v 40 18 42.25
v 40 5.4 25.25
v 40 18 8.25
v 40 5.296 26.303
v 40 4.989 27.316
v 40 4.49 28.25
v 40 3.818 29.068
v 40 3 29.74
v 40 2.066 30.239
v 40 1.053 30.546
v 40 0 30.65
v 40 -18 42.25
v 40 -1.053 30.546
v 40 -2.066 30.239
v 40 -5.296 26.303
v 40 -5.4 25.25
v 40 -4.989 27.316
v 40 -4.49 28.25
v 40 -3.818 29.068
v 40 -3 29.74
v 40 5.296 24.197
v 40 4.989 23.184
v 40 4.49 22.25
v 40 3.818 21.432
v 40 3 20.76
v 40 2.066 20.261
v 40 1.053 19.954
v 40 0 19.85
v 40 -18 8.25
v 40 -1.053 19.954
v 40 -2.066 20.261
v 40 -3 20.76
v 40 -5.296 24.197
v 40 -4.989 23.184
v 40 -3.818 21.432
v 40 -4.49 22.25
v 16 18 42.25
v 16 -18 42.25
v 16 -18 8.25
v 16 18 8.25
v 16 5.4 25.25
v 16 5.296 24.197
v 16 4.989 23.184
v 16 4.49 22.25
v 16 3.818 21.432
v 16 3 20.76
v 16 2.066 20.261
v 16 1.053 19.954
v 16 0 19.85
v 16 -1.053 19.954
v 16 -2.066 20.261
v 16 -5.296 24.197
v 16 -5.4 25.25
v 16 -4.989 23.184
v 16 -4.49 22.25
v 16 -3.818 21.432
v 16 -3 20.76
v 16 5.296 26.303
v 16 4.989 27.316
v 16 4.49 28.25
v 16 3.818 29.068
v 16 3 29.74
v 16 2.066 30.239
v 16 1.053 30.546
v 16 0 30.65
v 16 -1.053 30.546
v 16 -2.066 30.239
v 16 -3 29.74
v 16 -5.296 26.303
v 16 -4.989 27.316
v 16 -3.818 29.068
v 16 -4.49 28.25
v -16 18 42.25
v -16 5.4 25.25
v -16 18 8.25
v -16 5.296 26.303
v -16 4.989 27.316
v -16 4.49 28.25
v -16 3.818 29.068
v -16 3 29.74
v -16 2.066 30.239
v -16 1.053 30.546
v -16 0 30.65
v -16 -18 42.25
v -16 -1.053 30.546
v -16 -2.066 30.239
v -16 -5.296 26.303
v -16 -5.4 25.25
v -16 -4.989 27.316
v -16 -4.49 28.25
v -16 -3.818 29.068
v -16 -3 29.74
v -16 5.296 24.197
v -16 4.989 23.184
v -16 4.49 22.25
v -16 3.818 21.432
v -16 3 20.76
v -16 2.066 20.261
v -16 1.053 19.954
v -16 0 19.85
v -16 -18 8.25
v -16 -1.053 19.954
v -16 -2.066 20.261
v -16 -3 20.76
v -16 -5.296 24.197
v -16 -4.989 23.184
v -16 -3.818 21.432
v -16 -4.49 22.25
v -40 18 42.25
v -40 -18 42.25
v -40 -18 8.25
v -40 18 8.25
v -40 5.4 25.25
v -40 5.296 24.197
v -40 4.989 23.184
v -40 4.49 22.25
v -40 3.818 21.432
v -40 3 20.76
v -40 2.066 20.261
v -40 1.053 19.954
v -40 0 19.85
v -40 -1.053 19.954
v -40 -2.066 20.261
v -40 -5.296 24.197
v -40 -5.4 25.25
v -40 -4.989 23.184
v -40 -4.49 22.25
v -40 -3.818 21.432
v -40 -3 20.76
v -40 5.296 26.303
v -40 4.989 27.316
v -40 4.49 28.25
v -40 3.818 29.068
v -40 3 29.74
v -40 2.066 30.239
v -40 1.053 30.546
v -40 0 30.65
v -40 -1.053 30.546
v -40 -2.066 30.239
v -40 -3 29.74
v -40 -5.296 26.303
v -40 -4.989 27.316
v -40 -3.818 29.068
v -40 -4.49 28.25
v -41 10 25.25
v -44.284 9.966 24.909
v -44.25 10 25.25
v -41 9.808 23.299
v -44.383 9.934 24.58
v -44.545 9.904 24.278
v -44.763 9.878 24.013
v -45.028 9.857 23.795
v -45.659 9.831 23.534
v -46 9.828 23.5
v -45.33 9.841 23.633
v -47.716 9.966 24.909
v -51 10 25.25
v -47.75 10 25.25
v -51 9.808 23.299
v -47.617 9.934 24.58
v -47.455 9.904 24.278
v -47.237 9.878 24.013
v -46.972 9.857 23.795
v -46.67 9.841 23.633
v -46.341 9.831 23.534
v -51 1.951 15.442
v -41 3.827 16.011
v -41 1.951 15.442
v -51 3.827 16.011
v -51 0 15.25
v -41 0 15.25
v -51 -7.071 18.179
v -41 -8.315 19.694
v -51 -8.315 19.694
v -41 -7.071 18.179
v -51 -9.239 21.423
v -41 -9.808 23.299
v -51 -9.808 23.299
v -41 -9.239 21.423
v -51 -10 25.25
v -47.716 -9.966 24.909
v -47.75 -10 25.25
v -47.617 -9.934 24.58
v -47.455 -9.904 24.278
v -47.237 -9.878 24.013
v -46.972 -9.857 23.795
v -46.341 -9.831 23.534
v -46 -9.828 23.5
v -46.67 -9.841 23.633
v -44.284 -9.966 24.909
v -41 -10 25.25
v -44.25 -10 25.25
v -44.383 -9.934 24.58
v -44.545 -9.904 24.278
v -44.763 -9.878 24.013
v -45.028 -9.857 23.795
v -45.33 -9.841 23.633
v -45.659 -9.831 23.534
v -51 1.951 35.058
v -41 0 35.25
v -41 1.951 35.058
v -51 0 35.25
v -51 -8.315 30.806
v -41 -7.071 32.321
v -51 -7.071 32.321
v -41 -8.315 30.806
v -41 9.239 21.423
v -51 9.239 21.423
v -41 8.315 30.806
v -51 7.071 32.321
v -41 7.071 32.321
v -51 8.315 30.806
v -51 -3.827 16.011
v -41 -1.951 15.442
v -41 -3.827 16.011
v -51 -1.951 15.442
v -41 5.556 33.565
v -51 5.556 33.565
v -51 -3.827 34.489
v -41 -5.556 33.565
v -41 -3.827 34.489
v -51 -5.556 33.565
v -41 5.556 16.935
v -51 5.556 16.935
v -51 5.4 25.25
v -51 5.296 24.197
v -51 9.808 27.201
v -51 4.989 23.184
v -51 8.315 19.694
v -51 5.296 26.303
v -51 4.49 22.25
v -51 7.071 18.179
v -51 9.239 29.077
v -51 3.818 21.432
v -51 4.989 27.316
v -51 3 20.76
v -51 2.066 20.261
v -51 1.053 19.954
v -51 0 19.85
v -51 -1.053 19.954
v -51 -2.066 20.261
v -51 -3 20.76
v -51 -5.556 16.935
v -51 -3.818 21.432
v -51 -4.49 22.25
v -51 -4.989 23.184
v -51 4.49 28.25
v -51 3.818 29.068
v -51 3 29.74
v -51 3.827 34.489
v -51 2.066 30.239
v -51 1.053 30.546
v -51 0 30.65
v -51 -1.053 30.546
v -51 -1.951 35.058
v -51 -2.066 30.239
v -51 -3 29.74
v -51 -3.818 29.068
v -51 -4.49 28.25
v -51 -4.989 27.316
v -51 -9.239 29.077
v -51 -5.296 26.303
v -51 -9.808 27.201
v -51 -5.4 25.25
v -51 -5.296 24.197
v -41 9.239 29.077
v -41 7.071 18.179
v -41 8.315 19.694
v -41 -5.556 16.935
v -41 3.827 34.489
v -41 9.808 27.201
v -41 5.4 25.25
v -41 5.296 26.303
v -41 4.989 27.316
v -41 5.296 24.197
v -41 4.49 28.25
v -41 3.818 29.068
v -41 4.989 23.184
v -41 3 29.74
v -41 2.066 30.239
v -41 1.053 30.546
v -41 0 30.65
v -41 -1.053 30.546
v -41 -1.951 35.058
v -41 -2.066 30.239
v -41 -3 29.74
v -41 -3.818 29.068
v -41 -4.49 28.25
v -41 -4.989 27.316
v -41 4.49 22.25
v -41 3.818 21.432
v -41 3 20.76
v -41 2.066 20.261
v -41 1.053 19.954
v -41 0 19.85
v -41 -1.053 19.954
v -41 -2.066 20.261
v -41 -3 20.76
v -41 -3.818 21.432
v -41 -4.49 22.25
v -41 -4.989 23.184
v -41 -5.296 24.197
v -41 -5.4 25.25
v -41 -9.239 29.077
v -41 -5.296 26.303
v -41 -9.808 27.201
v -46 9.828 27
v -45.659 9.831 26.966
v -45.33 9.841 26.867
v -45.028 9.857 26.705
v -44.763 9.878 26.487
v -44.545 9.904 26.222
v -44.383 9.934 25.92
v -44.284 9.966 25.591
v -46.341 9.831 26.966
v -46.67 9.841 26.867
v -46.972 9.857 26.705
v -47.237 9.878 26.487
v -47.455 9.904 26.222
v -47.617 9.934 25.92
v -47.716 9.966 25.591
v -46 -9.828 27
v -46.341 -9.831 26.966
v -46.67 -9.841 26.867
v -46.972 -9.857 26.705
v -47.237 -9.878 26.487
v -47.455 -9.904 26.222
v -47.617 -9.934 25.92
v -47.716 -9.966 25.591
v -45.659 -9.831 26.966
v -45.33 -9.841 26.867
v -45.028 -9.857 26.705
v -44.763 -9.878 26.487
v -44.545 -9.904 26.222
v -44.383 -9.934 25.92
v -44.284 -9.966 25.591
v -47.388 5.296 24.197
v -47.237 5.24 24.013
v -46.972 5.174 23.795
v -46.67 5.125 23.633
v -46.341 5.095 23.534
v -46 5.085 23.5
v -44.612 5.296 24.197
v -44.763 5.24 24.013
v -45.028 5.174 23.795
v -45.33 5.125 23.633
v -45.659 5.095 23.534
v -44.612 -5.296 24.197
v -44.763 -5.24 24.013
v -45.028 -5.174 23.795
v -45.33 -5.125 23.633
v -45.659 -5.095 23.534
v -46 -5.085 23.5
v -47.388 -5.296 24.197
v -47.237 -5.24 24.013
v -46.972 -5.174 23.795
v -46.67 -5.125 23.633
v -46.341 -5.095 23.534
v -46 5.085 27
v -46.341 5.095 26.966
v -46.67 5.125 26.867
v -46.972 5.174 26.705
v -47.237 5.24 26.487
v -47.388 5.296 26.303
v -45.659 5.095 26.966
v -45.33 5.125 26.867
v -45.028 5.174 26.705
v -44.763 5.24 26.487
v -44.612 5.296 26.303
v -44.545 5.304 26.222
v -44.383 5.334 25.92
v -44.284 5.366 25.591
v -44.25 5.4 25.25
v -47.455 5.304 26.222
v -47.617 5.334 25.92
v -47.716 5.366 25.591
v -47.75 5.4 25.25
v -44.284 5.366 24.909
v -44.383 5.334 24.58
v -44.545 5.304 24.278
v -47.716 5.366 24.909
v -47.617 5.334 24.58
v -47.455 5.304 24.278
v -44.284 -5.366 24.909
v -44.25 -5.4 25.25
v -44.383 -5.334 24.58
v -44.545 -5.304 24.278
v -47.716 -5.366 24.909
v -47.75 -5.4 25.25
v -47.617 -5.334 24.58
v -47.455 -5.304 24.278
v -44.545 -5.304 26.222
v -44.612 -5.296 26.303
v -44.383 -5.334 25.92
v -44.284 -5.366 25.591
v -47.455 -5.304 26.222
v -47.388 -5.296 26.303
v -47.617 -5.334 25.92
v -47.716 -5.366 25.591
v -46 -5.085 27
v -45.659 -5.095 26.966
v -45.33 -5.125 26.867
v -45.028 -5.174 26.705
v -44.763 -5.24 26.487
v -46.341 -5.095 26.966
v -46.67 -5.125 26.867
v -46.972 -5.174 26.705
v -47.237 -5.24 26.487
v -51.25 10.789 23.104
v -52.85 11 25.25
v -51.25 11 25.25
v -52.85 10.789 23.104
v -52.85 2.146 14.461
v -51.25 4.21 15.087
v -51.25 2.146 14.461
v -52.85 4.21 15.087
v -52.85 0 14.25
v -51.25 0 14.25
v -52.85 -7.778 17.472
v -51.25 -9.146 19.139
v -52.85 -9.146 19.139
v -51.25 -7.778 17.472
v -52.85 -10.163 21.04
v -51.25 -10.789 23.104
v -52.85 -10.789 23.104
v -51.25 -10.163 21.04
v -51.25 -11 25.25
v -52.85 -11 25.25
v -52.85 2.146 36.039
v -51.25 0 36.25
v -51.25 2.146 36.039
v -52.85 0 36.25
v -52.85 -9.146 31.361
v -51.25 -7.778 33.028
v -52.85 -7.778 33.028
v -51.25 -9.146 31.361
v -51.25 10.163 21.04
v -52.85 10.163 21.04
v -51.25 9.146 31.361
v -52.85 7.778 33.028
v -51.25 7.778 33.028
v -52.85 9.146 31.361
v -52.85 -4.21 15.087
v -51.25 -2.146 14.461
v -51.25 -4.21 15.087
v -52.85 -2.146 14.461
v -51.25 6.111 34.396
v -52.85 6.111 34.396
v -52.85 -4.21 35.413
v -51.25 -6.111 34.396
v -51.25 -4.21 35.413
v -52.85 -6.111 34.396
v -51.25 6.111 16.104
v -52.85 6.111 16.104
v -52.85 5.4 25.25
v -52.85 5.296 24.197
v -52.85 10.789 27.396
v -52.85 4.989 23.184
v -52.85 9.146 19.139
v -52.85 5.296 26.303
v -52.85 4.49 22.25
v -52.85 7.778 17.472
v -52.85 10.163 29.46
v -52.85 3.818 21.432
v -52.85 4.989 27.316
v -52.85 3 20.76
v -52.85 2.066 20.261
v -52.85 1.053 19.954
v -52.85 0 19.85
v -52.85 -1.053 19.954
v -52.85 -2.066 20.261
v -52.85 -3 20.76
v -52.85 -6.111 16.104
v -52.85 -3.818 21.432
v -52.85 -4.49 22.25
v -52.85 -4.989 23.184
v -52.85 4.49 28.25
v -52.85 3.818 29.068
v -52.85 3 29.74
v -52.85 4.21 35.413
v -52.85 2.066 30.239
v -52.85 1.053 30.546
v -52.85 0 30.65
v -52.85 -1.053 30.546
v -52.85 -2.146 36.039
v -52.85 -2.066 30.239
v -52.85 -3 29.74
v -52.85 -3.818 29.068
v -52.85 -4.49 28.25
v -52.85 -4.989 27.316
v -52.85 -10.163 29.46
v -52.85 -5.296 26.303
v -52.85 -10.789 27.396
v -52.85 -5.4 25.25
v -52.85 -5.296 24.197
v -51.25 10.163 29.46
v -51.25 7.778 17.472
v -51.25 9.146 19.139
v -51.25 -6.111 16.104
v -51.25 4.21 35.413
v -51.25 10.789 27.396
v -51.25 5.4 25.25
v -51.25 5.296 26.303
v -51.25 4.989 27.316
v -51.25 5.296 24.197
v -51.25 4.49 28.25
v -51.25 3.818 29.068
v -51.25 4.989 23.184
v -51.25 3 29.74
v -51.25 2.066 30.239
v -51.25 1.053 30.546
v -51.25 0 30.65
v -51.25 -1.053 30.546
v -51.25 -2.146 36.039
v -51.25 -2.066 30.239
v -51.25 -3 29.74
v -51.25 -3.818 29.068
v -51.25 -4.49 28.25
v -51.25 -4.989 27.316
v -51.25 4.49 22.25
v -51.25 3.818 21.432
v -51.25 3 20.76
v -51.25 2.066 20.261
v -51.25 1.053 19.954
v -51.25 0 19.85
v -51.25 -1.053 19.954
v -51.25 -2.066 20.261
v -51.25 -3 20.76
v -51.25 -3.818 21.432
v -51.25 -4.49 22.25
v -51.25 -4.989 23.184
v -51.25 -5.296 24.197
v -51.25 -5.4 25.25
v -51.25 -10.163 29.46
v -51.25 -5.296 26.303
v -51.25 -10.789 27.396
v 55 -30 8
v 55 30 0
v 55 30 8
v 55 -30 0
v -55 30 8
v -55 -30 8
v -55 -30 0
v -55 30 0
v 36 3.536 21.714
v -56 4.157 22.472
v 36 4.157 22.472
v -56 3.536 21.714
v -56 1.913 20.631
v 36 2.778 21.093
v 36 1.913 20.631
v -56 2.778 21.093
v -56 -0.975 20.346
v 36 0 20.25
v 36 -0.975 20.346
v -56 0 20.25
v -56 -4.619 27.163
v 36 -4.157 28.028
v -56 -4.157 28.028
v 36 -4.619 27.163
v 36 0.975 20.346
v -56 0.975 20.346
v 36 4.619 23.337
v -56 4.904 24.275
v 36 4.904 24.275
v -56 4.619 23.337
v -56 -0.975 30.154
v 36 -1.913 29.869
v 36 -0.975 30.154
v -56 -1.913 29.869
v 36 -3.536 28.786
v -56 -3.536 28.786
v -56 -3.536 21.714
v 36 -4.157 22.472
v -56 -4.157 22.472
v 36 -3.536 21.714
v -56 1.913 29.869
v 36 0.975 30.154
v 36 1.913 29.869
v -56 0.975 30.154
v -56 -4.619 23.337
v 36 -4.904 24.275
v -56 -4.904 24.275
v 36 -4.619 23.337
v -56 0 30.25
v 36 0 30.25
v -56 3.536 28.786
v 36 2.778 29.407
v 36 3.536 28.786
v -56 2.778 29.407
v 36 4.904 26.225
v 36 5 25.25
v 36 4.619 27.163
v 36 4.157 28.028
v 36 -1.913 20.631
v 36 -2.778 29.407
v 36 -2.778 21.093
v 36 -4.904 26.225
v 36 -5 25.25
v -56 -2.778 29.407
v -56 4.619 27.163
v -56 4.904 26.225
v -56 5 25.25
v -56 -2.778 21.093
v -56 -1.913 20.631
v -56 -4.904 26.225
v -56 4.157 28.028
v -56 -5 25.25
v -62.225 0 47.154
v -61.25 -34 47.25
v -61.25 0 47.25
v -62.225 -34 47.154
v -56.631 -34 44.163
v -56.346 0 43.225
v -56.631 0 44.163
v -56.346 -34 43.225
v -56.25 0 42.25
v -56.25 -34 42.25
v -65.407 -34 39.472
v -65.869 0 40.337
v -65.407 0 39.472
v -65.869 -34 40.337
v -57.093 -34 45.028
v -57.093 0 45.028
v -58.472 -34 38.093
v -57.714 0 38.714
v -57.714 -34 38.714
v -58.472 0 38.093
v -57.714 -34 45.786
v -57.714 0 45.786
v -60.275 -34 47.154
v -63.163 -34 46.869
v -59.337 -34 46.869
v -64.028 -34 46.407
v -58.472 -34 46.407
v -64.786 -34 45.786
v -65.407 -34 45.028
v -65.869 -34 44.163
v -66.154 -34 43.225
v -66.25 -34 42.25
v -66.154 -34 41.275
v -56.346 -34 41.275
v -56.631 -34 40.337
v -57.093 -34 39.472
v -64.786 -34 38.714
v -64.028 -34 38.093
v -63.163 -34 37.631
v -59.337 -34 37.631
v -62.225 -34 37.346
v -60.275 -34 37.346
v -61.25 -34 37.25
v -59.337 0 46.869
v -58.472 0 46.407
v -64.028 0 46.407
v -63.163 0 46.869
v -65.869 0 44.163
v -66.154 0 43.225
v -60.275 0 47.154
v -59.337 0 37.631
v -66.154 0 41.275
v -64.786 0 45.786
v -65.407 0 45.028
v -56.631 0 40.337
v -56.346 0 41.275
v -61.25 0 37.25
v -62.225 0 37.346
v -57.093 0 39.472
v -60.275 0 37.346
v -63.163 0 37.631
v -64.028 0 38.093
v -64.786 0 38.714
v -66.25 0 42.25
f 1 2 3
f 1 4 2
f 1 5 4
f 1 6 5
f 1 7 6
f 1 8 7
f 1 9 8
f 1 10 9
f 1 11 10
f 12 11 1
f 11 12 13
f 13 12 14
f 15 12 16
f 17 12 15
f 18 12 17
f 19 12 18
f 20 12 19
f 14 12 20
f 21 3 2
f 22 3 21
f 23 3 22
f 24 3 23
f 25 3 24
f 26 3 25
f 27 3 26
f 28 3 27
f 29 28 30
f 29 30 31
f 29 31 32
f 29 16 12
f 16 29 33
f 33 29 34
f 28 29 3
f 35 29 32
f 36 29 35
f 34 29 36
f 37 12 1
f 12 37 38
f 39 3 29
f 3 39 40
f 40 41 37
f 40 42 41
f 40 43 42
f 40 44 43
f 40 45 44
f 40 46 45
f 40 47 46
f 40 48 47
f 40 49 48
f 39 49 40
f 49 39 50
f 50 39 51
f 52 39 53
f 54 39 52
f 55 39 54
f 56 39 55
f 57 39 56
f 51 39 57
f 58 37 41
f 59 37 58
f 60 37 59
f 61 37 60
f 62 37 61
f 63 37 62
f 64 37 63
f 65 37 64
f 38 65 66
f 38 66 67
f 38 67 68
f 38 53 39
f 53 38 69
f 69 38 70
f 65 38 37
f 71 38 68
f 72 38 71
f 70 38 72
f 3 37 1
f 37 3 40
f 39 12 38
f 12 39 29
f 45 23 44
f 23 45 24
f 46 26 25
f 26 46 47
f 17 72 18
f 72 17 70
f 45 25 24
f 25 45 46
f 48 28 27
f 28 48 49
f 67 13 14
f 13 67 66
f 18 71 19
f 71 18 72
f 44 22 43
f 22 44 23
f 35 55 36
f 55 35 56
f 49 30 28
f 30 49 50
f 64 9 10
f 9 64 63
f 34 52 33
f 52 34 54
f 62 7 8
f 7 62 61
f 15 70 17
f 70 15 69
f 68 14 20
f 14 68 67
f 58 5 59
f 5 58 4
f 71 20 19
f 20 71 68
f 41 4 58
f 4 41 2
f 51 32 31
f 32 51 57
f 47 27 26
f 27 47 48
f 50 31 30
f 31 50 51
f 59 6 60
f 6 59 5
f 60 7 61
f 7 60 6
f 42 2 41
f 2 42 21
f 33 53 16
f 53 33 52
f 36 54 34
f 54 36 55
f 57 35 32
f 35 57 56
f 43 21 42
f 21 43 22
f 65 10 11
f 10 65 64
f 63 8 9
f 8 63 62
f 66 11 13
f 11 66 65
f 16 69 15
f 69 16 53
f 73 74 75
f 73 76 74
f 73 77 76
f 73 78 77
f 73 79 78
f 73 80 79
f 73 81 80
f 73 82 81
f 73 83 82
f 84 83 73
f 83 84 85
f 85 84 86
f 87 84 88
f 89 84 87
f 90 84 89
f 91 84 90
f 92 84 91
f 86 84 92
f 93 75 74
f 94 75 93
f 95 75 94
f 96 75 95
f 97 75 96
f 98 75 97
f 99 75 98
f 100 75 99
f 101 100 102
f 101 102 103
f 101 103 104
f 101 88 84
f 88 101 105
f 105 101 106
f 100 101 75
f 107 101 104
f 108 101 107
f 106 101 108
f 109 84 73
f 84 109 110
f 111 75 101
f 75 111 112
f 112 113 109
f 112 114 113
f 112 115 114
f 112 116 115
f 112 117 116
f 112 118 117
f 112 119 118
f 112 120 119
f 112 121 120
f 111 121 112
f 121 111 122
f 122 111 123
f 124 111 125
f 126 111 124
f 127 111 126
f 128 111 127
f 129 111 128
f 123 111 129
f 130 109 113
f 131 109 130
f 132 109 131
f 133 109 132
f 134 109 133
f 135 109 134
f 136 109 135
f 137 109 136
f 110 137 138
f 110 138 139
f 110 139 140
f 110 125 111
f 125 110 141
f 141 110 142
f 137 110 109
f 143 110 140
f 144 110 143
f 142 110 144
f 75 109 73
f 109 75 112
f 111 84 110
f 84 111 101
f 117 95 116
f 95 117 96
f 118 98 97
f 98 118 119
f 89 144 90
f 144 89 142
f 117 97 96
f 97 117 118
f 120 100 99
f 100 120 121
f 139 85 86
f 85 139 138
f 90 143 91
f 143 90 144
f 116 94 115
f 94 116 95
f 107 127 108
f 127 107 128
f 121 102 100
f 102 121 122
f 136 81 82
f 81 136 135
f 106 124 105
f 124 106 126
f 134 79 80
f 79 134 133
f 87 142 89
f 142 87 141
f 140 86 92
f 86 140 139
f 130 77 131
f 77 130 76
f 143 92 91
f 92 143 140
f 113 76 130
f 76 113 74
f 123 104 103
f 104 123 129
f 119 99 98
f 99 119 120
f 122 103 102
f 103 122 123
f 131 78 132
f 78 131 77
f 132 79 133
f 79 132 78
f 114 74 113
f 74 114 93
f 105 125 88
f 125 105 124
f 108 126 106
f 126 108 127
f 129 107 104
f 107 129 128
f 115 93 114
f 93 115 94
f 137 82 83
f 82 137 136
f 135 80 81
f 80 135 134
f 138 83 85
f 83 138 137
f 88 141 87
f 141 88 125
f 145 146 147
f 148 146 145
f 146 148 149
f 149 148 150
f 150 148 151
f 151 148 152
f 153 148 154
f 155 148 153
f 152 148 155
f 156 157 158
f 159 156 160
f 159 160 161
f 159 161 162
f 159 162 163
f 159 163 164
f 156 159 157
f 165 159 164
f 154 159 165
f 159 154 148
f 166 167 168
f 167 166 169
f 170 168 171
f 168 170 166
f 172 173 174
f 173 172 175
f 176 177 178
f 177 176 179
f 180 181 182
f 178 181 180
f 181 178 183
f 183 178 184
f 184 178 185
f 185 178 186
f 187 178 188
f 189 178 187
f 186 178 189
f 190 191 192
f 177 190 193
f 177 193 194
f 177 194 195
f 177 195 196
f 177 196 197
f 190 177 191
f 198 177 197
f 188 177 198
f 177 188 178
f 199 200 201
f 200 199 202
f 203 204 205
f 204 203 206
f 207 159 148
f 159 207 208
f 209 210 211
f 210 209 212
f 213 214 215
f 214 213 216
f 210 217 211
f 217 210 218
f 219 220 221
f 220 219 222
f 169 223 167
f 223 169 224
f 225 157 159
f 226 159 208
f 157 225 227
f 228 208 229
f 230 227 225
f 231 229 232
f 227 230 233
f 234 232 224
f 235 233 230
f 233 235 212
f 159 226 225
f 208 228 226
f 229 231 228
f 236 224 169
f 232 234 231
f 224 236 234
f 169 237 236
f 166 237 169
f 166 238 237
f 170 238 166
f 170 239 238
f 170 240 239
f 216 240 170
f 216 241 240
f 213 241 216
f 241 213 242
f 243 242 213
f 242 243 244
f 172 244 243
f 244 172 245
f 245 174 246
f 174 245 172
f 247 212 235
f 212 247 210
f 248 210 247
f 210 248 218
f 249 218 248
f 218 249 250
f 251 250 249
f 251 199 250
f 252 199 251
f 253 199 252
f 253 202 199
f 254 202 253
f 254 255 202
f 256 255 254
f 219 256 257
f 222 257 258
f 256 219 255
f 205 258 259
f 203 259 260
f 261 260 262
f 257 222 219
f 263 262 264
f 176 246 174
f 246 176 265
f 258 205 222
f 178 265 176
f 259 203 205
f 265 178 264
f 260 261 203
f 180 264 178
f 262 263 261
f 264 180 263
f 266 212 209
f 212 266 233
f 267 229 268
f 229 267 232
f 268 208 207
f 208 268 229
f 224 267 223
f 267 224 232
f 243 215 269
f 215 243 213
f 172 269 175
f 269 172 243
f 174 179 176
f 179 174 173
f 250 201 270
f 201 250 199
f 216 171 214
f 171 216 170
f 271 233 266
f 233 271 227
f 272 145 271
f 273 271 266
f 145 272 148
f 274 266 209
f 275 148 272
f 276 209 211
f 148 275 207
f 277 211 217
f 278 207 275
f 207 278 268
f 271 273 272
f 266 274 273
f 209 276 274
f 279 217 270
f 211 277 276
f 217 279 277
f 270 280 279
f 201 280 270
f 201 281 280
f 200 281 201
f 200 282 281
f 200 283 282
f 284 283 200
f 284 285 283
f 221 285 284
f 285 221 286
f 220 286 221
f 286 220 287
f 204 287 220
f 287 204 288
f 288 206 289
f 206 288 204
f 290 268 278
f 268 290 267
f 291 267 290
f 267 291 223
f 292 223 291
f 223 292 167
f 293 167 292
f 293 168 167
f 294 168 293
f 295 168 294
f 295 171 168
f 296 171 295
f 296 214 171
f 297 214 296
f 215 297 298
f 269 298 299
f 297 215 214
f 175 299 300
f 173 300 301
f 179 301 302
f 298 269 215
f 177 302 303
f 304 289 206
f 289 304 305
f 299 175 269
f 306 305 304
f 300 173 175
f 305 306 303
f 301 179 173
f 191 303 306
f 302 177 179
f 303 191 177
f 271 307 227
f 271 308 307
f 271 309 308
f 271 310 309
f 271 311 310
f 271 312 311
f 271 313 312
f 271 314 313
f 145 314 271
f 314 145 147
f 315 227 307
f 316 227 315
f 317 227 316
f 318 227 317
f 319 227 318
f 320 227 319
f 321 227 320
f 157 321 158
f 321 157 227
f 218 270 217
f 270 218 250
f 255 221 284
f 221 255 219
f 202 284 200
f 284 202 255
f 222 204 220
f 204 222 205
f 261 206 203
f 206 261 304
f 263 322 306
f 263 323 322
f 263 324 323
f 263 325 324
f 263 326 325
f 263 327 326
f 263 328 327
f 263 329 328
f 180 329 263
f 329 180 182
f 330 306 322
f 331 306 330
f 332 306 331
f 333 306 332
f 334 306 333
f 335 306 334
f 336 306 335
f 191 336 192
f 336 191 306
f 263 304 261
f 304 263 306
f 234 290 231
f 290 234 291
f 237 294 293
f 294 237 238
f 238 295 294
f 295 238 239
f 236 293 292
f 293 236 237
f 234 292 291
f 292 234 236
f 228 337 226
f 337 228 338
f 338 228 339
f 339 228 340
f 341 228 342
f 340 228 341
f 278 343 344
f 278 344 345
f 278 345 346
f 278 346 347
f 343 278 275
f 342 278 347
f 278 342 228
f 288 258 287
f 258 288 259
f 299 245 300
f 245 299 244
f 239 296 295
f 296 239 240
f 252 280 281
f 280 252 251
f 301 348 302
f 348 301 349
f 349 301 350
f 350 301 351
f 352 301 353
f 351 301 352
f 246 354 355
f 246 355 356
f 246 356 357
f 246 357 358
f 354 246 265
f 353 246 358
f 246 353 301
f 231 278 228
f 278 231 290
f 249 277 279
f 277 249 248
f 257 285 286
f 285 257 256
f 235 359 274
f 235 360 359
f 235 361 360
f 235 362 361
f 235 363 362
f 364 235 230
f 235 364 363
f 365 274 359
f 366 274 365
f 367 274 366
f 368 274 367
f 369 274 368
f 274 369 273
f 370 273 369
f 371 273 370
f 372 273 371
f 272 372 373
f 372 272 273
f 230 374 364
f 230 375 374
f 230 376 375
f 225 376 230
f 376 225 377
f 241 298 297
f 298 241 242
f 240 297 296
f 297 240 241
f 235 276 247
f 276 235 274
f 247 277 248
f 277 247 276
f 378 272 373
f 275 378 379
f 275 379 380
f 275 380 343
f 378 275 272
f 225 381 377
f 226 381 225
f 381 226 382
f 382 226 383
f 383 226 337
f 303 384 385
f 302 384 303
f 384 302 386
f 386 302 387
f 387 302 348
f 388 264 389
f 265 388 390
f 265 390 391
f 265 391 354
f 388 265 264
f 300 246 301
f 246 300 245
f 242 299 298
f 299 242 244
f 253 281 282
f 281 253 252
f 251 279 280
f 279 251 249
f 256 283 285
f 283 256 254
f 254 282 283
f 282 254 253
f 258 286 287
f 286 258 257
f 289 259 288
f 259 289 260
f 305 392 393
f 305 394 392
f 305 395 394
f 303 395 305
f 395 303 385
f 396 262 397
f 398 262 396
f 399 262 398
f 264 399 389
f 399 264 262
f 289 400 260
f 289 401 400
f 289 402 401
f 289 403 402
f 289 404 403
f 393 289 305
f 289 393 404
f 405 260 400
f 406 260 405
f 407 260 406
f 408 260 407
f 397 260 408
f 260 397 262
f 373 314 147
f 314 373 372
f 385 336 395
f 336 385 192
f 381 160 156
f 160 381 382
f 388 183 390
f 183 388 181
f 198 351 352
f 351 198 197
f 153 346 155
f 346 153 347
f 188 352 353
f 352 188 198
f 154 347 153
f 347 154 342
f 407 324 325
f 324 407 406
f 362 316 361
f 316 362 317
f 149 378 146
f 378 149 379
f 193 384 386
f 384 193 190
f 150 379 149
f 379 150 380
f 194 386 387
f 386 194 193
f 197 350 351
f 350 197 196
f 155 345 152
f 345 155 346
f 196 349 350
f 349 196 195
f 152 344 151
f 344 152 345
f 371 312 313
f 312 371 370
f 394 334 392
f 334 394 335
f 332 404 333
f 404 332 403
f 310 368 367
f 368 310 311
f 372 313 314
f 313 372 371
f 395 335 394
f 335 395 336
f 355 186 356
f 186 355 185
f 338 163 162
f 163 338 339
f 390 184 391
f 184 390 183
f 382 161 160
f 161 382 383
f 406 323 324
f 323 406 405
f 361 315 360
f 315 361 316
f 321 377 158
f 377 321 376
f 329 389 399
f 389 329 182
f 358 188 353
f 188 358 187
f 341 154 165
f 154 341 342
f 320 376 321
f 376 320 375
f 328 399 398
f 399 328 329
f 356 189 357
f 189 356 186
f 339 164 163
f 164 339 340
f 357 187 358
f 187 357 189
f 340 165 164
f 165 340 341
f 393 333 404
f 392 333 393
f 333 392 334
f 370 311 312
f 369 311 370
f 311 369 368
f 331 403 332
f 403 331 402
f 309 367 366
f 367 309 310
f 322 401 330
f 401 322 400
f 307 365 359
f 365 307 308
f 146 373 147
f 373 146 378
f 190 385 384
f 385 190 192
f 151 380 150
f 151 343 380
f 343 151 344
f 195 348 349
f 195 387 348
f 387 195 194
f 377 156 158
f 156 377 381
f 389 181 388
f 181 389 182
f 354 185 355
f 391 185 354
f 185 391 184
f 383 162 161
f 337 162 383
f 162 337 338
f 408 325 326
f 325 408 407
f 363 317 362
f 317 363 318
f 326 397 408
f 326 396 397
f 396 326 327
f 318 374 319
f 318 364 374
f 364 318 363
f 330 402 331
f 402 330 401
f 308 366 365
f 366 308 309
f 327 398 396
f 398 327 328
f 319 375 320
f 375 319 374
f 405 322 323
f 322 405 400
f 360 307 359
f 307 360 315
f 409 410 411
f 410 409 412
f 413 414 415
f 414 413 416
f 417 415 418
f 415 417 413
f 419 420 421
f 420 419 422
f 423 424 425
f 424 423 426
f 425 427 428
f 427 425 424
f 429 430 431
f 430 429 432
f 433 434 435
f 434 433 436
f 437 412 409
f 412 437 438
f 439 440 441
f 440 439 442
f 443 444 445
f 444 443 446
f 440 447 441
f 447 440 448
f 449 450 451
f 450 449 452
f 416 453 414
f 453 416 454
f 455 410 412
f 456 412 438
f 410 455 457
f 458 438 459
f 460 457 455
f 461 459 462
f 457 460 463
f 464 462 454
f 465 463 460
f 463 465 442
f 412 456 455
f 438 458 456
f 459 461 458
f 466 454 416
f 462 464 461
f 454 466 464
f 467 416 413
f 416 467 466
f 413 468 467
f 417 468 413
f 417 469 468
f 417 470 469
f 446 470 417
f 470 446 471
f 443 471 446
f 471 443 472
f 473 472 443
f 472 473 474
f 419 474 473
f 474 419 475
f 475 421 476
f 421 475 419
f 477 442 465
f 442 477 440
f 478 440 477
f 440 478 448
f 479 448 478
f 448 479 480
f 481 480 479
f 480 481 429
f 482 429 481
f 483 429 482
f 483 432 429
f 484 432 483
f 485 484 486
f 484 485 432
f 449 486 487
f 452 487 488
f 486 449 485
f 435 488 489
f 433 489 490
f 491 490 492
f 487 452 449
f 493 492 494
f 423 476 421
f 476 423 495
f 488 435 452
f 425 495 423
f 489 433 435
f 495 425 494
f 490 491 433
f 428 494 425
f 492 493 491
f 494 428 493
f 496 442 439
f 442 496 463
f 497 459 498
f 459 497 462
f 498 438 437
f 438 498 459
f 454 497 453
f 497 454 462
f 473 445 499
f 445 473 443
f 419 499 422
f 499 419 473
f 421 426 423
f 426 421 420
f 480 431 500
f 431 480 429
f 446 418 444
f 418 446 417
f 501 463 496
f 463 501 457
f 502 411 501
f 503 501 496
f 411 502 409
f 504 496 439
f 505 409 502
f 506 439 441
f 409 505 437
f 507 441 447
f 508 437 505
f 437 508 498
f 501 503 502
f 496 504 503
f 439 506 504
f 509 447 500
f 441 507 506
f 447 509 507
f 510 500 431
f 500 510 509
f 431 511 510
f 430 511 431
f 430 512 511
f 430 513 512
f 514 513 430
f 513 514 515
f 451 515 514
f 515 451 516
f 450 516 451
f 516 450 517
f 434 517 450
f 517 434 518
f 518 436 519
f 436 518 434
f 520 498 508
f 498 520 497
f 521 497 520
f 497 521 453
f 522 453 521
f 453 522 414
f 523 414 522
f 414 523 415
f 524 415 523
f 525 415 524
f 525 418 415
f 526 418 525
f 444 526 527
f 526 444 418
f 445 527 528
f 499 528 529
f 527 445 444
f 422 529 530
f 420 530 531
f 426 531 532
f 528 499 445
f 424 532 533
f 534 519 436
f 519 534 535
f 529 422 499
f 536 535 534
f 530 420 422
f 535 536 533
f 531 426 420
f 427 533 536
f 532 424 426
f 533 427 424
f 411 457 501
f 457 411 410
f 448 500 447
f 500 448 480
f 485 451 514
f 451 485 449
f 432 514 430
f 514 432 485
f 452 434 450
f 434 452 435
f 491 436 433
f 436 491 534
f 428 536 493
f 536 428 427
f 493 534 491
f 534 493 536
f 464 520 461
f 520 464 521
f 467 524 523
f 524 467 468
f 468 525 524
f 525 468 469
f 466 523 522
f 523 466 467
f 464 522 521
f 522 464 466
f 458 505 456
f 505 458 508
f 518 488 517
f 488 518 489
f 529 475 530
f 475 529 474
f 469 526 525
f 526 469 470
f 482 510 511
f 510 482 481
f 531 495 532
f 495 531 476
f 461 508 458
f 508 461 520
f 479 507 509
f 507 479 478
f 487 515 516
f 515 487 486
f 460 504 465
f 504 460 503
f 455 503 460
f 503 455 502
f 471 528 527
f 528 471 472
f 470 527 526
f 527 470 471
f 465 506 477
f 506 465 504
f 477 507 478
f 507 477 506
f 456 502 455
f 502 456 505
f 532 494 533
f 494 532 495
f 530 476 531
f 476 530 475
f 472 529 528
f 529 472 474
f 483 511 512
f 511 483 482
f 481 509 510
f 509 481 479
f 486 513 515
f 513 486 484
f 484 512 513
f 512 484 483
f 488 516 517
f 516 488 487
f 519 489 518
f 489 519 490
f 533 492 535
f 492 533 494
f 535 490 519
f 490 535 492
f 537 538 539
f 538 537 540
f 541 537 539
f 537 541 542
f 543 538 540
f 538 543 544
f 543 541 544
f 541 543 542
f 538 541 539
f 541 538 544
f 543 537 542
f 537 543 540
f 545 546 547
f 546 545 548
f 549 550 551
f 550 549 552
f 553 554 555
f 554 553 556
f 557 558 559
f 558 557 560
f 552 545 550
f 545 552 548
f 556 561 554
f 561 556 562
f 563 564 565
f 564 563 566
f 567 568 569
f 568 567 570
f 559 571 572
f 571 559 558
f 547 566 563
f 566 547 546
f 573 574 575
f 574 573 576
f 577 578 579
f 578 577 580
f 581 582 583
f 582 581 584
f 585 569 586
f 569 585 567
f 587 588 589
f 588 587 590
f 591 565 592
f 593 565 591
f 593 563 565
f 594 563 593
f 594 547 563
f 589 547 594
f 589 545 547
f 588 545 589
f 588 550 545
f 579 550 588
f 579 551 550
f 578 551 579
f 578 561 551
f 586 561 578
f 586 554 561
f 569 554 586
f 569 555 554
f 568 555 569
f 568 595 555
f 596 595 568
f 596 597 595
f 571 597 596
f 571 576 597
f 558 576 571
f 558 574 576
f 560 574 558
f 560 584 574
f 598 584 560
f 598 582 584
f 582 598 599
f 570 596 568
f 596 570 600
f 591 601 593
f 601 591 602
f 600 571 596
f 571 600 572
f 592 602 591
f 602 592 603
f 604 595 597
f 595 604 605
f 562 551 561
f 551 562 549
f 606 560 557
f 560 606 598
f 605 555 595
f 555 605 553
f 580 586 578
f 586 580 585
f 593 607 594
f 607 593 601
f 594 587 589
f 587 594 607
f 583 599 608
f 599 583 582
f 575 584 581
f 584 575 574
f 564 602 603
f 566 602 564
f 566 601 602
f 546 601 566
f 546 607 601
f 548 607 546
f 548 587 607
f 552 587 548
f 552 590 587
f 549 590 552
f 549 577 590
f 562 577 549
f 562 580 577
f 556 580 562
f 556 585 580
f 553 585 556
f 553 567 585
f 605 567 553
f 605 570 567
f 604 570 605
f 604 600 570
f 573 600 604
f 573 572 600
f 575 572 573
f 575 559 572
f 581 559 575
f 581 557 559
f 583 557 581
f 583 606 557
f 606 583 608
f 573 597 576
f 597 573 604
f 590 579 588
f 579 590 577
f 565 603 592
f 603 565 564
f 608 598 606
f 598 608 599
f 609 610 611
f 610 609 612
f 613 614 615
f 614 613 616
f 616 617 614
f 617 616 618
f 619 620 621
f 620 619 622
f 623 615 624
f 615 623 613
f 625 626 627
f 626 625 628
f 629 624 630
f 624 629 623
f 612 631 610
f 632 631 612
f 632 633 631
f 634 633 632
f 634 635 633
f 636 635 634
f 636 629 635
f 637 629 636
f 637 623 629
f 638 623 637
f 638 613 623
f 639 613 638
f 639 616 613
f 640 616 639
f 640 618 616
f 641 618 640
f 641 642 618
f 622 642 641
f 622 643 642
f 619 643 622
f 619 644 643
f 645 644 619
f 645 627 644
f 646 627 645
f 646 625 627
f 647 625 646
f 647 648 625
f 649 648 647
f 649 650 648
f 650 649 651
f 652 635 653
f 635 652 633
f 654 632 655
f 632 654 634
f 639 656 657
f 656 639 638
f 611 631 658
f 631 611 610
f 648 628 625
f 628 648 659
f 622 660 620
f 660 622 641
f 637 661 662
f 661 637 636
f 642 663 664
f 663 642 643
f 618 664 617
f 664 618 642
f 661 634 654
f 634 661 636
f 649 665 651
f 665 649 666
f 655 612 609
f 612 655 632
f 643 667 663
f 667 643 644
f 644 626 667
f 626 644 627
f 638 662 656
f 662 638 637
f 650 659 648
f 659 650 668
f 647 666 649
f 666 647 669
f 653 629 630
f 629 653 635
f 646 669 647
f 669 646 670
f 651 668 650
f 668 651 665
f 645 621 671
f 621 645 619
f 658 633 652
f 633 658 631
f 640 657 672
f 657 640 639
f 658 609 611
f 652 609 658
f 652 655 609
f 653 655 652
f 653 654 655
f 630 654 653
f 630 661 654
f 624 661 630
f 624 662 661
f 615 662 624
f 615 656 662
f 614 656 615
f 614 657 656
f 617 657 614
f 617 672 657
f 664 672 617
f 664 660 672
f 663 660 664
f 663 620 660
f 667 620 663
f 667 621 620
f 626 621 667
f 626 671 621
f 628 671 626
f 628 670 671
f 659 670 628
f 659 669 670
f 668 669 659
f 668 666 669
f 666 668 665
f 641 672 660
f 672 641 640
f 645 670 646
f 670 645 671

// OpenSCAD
$fn = 32;

// ------------------------------------------------------------------------
// Machine vise: screw d10, jaws 24 x 34 mm
// Every part is its own module, assembly() places every instance.
// ------------------------------------------------------------------------

// --- part 1 ---
module vise_bed() {
  difference() {
    translate([-55, -30, 0]) cube([110, 60, 8]);
  }
}

// --- part 2 ---
module vise_jaw() {
  difference() {
    translate([-12, -18, 0]) cube([24, 36, 34]);
    translate([0, 0, 17]) rotate([0, 90, 0]) cylinder(h = 26, d = 10.8, center = true);
  }
}

// --- part 3 ---
module vise_screw() {
  translate([0, 0, -46]) cylinder(h = 92, d = 10);
}

// --- part 4 ---
module screw_collar() {
  difference() {
    cylinder(h = 10, d = 20);
    translate([0, 0, -1]) cylinder(h = 12, d = 10.8);
    translate([0, 0, 5]) rotate([90, 0, 0]) cylinder(h = 22, d = 3.5, center = true);
  }
}

// --- part 5 ---
module screw_washer() {
  difference() {
      translate([0, 0, 0]) cylinder(h = 1.6, d = 22);
      translate([0, 0, -1]) cylinder(h = 3.6, d = 10.8);
    }
}

// --- part 6 ---
module vise_handle() {
  cylinder(h = 34, d = 10);
}

// --- assembly ---
module assembly() {
  color([0.80, 0.24, 0.20]) translate([0, 0, 0]) rotate([0, 0, 0]) vise_bed();
  color([0.20, 0.45, 0.75]) translate([28, 0, 8.25]) rotate([0, 0, 0]) vise_jaw();
  color([0.25, 0.62, 0.32]) translate([-28, 0, 8.25]) rotate([0, 0, 0]) vise_jaw();
  color([0.92, 0.70, 0.18]) translate([-10, 0, 25.25]) rotate([0, 90, 0]) vise_screw();
  color([0.58, 0.35, 0.70]) translate([-51, 0, 25.25]) rotate([0, 90, 0]) screw_collar();
  color([0.16, 0.66, 0.66]) translate([-52.85, 0, 25.25]) rotate([0, 90, 0]) screw_washer();
  color([0.85, 0.48, 0.18]) translate([-61.25, 0, 42.25]) rotate([90, 0, 0]) vise_handle();
}

assembly();
